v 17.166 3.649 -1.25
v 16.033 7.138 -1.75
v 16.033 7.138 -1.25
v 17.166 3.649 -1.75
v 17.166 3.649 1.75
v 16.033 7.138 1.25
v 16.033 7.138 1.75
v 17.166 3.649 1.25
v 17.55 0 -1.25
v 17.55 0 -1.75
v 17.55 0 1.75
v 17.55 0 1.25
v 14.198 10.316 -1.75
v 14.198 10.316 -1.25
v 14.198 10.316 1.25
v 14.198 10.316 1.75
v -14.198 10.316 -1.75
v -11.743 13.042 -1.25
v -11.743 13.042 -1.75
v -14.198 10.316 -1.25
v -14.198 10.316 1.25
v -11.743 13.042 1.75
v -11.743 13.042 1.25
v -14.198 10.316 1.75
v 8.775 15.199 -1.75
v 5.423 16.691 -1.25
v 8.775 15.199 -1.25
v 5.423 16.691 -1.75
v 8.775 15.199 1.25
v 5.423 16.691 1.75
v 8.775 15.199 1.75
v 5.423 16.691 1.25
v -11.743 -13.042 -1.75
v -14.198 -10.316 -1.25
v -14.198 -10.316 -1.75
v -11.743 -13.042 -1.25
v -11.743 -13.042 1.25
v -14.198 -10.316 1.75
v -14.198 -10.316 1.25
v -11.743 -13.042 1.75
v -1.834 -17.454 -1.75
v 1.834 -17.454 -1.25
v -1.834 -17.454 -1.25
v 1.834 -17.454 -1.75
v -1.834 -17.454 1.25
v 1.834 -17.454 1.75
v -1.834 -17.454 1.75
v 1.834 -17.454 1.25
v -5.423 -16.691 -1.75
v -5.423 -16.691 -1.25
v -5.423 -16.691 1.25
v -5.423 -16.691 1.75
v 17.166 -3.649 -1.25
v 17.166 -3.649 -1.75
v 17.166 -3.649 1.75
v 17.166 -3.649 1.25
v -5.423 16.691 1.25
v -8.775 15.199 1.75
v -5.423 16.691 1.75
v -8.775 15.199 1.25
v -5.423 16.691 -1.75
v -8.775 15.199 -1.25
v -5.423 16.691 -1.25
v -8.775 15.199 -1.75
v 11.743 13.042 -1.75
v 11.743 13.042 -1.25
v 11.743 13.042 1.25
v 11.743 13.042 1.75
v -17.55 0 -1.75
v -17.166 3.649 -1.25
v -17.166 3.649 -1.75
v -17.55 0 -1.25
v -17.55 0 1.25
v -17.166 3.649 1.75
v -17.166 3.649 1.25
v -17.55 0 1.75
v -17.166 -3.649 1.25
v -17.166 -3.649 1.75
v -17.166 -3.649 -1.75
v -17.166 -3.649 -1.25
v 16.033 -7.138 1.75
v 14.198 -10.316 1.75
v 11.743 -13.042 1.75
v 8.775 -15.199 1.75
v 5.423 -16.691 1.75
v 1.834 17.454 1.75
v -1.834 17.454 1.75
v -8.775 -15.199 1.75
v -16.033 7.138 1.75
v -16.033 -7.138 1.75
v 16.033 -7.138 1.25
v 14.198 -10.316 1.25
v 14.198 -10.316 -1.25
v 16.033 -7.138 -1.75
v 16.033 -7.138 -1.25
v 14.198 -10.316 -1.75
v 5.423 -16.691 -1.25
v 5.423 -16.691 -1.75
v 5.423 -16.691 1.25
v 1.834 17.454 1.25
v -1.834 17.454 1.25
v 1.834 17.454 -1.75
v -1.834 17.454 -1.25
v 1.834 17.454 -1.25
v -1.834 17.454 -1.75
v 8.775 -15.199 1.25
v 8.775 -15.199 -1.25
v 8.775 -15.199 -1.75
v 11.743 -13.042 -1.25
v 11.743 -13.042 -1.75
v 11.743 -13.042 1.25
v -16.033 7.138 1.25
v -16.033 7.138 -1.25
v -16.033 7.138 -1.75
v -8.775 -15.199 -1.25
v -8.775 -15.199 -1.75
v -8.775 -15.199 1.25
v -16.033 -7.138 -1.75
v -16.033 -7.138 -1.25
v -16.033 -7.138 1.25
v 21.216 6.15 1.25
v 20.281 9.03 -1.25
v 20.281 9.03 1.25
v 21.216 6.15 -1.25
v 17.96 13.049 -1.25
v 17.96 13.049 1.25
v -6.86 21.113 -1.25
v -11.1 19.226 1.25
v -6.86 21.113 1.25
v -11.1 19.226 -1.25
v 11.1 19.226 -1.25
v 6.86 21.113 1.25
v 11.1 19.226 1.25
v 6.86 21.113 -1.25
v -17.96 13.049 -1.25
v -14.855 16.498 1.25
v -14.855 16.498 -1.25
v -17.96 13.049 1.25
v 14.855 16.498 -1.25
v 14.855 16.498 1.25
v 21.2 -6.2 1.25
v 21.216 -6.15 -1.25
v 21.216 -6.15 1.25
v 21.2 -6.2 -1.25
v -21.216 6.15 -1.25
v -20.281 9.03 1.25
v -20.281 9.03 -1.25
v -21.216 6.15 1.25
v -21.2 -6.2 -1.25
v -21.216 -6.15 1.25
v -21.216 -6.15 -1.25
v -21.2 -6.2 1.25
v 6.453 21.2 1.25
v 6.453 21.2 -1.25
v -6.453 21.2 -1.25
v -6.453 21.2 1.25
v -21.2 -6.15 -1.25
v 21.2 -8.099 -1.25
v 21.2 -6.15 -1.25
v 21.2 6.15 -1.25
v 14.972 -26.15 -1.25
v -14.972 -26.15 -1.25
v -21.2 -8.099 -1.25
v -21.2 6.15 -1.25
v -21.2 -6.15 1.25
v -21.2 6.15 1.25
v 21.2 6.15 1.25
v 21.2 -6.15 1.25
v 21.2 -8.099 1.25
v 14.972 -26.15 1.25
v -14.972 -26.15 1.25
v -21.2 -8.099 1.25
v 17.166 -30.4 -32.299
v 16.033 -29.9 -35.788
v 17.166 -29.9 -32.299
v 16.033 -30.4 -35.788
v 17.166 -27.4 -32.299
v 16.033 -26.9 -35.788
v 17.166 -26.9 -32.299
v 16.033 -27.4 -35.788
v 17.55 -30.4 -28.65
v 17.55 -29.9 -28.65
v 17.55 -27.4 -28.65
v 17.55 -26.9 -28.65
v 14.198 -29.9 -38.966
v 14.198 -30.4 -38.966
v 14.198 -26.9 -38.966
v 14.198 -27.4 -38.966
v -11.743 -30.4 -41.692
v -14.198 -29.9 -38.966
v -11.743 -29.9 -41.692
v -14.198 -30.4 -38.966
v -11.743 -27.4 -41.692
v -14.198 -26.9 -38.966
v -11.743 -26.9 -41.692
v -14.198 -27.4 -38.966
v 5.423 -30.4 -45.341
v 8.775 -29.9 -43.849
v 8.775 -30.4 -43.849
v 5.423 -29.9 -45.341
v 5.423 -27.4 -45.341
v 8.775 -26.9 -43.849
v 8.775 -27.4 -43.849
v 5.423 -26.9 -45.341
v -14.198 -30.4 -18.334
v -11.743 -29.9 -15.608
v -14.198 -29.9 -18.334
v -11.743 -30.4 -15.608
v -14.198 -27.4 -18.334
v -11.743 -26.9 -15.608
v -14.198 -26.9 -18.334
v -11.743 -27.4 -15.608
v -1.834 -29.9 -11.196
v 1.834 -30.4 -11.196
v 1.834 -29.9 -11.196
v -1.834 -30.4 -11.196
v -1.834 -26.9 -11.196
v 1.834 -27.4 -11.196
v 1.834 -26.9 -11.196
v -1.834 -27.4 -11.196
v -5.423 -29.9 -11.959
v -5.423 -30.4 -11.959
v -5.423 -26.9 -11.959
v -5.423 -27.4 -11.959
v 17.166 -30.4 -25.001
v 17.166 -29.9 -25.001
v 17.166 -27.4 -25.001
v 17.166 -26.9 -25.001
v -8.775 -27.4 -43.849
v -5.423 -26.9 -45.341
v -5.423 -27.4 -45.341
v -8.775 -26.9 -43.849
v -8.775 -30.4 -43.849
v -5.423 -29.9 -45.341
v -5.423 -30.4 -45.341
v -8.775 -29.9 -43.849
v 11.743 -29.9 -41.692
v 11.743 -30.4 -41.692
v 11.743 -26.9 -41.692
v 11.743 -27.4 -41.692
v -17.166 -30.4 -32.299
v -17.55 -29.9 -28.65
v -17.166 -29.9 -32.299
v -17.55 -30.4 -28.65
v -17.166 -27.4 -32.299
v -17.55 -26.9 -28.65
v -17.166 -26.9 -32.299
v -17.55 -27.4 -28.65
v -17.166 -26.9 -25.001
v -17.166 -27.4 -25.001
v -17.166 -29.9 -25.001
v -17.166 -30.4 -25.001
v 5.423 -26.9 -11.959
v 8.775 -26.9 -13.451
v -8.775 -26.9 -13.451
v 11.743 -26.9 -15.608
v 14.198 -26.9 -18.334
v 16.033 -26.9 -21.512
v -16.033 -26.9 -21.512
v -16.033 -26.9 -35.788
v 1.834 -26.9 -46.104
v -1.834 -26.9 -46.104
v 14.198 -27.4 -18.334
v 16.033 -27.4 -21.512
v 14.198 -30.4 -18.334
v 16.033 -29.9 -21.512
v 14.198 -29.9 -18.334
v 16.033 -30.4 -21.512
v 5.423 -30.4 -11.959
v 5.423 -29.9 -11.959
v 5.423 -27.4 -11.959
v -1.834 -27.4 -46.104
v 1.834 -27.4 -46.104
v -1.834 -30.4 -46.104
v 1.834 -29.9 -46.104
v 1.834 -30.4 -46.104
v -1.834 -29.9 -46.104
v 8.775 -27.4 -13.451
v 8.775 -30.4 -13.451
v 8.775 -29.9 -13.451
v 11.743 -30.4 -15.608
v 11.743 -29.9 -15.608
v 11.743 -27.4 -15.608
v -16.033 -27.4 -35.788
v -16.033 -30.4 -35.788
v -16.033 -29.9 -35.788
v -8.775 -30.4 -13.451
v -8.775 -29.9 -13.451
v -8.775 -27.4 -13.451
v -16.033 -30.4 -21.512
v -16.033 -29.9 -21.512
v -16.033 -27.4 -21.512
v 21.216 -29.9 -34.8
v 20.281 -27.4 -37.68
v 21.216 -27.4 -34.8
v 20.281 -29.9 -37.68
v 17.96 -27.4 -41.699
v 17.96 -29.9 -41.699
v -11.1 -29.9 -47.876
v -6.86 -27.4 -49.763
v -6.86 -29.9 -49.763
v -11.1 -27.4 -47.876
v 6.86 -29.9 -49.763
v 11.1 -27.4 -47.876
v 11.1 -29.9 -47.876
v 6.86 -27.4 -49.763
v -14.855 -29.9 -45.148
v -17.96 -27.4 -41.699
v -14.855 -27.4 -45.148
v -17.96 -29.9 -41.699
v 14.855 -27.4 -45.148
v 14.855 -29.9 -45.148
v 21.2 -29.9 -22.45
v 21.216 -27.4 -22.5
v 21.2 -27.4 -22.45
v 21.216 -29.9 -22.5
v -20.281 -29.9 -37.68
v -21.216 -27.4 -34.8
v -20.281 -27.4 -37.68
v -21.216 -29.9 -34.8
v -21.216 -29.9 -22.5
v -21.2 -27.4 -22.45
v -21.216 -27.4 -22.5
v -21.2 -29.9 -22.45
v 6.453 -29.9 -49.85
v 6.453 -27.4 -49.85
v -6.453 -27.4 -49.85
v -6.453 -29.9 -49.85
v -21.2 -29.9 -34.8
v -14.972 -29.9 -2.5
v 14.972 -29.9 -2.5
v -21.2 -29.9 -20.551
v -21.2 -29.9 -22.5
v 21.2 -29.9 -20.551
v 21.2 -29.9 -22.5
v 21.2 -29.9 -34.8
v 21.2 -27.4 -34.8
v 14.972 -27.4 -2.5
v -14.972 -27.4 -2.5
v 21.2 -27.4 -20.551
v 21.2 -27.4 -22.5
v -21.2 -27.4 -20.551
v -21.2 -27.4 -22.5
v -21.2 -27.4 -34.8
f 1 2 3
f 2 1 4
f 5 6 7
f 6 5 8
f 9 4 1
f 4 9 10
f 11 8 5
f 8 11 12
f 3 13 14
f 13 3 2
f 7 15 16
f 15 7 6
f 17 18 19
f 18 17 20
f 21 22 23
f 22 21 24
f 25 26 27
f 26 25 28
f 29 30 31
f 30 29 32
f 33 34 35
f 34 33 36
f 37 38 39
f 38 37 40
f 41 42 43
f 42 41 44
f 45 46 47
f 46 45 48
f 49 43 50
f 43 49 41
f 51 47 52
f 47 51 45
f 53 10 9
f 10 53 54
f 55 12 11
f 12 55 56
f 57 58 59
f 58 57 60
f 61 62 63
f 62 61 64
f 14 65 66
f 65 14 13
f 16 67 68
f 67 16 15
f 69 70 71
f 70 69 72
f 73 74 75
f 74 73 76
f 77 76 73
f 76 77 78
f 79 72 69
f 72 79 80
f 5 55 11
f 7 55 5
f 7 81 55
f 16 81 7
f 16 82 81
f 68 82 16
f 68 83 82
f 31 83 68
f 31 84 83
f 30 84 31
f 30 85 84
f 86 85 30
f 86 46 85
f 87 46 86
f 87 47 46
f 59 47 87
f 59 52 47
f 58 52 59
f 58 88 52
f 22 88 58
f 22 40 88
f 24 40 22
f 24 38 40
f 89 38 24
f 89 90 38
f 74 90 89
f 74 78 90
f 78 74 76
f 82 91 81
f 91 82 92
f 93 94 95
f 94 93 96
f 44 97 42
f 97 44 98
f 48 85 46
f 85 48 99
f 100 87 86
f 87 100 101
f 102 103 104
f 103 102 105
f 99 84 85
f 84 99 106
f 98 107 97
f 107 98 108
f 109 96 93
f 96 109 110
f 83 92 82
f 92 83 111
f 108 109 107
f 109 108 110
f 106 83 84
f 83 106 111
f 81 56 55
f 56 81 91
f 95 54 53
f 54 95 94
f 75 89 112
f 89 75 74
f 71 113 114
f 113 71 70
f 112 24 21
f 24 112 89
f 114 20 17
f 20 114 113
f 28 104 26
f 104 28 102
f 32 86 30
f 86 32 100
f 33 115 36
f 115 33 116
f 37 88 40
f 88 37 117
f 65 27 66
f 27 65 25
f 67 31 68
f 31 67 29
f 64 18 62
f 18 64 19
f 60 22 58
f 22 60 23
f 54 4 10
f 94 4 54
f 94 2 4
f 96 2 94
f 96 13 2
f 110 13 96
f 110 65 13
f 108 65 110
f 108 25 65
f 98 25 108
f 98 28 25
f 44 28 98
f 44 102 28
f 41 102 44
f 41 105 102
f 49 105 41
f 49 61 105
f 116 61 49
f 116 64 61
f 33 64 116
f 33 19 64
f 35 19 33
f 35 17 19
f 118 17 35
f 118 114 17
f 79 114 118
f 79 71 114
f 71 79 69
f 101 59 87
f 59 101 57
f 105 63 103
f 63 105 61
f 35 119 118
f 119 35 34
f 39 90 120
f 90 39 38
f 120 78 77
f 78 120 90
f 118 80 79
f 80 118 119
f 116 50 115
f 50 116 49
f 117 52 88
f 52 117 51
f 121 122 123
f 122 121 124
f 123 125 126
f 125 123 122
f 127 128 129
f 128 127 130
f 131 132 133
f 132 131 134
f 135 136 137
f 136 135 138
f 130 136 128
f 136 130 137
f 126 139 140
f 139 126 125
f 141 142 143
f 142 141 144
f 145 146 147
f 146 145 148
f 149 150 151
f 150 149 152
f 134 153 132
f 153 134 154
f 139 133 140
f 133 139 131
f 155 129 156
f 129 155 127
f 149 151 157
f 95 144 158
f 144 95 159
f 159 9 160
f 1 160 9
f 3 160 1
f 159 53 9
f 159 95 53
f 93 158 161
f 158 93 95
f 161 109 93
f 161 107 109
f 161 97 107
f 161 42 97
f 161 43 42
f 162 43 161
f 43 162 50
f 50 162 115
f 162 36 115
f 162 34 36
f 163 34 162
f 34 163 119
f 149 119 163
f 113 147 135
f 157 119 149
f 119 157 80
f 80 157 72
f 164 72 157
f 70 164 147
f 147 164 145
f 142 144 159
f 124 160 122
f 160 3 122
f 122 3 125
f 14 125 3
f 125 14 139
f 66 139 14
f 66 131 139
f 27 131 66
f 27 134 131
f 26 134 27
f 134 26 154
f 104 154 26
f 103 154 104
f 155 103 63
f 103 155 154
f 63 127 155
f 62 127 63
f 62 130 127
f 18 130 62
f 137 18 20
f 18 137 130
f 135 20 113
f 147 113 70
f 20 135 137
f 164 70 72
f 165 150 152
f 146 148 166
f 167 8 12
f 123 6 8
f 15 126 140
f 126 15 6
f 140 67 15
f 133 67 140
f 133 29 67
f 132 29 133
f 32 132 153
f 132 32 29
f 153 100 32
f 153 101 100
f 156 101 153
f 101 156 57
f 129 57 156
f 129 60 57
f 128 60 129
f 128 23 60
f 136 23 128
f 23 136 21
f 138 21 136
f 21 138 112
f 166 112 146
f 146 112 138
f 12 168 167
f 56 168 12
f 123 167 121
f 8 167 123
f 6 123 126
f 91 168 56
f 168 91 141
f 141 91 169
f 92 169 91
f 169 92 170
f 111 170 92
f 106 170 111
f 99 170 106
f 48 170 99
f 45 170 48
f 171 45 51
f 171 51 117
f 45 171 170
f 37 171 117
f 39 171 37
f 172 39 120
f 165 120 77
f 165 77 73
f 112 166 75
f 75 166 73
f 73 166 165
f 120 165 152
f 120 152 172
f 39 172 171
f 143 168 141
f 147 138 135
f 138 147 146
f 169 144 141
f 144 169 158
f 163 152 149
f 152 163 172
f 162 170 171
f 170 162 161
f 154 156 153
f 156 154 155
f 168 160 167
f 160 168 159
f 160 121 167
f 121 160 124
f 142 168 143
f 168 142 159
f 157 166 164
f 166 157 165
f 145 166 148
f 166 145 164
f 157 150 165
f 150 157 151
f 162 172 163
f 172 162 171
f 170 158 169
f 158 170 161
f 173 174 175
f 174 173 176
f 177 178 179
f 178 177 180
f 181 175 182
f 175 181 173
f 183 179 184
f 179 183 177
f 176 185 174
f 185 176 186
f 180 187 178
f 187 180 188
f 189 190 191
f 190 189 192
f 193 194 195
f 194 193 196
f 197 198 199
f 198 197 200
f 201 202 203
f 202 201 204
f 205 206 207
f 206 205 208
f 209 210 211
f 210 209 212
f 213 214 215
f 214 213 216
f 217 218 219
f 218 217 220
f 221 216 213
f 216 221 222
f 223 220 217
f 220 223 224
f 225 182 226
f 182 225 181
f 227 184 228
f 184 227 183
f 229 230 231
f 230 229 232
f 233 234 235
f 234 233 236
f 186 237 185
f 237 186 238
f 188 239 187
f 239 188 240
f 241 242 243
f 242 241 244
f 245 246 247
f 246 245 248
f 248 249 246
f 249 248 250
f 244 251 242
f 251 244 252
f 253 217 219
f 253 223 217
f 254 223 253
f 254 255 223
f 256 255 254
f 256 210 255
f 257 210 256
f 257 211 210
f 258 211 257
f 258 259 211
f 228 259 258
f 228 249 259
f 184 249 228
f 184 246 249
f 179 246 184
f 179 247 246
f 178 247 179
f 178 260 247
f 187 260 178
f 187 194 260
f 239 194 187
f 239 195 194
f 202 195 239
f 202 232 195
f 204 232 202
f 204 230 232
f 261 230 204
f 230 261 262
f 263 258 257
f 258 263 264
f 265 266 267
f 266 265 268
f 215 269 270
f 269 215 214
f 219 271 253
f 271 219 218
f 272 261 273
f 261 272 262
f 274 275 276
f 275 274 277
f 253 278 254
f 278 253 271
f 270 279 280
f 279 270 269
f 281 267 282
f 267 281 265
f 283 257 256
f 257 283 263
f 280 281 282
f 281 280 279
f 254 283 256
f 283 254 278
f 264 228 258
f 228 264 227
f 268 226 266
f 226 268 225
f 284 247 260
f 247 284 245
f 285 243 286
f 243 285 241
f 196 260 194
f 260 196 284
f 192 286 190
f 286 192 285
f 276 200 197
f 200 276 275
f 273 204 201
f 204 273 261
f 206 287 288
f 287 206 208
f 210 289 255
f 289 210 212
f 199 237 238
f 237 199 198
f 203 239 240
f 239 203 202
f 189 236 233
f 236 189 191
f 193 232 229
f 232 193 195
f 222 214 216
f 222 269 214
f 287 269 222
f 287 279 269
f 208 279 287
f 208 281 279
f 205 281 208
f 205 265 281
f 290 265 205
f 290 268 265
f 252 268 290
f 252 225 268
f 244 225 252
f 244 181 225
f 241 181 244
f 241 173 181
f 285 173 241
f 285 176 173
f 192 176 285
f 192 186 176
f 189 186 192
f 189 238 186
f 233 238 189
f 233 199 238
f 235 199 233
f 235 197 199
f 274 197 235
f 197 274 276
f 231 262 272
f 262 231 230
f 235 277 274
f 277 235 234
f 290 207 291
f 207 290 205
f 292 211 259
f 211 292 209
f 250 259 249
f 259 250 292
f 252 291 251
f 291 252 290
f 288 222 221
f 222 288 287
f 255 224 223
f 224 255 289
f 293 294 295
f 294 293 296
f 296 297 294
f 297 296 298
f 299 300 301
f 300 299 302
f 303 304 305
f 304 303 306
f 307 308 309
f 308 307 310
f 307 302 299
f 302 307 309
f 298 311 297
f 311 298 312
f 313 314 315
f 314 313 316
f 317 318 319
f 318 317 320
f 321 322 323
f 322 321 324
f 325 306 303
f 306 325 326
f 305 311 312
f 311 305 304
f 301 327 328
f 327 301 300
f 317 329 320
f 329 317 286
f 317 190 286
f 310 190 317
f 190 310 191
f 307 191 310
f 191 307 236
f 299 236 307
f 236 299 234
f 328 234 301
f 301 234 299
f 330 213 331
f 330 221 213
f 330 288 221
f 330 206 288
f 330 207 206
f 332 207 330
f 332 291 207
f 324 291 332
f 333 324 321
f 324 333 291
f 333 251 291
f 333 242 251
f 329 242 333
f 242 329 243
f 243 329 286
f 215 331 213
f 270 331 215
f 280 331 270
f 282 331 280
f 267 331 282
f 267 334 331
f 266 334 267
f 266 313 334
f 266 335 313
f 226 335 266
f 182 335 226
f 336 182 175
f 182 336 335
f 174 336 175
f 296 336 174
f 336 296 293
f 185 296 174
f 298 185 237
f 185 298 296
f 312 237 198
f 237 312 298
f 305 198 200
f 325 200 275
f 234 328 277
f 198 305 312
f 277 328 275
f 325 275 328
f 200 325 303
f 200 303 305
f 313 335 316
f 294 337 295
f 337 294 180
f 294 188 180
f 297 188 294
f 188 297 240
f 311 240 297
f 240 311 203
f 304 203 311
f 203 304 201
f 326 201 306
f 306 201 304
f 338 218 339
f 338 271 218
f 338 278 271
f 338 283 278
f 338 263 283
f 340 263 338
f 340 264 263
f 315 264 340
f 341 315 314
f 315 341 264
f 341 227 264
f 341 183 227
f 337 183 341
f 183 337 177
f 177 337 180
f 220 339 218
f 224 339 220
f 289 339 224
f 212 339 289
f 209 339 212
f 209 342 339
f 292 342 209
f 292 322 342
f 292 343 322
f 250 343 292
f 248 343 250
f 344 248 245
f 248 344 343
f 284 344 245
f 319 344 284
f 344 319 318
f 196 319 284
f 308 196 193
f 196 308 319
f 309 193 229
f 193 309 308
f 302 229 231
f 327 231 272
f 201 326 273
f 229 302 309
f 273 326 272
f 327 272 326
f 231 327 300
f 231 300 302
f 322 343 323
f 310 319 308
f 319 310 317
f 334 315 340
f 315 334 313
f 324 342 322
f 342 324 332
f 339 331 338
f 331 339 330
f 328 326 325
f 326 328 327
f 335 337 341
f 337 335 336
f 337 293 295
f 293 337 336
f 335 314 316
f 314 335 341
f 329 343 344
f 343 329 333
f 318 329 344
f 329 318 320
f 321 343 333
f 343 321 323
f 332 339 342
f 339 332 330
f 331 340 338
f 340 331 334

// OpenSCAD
n_faces=8;
def=10;

LCDr0=35.1/2;
LCDr1=22.2;

LCDz=2.5;
MODz=4.9-2.5;

LCDx1=42.4;
LCDx2=35.5;
LCDx3=32.0;
LCDx4=13.2;

LCDy0=46.9;
LCDy1=20.0;
LCDy2=12.3;
LCDy3=21.2;
LCDy4=14.6;

3Dprintflag=0;
uLCD220_tr = 3Dprintflag ? [0,0,0] : [0,0,0];
uLCD220_rot = 3Dprintflag ? [0,0,0] : [0,0,0];


// Screen itself
translate(uLCD220_tr){rotate(uLCD220_rot){uLCD220();}}

module uLCD220() {
	uLCD220_screen();
	translate([0,(-(LCDy1+LCDy2/2+LCDz)),(-(LCDy1+LCDy2/2+LCDz))]) {rotate([-90,0,0]) {uLCD220_screen();}}
}

module uLCD220_screen() {
	difference() {
		union() {
				color([0/255, 0/255, 0/255]) {cylinder(r=LCDr0, h=LCDz+1, center=true);}
				cylinder(r=LCDr1, h=LCDz, center=true);
				translate([0,-LCDy1/2-LCDy2/2, 0]) {cube(size=[LCDx1,LCDy1,LCDz], center=true);}
			}
			
		union() {
			translate([0, LCDy3+def/2, 0]) {cube(size=[LCDx4,def,def], center=true);}
			translate([+(LCDx1/2+def/2), 0, 0]) {cube(size=[def,LCDy2,def], center=true);}
			translate([-(LCDx1/2+def/2), 0, 0]) {cube(size=[def,LCDy2,def], center=true);}
			translate([-LCDx1/2-.5, -LCDy1-LCDy2/2-.5, 0]) {
				polyhedron(
					points=[[0,0,-def],[0,LCDy1,-def],[LCDx1-LCDx2,0,-def],[0,0,def],[0,LCDy1,def],[LCDx1-LCDx2,0,def]],
					faces=[[0,2,1],[3,4,5],[0,1,4,3],[0,3,5,2],[5,4,1,2]]);
			}
			translate([LCDx1/2+.5, -LCDy1-LCDy2/2-.5, 0]) {
				polyhedron(
					points=[[0,0,-def],[0,LCDy1,-def],[-(LCDx1-LCDx2),0,-def],[0,0,def],[0,LCDy1,def],[-(LCDx1-LCDx2),0,def]],
					faces=[[0,1,2],[3,5,4],[0,3,4,1],[0,2,5,3],[1,4,5,2]]);
			}
		}
	}
	
}

	

	
